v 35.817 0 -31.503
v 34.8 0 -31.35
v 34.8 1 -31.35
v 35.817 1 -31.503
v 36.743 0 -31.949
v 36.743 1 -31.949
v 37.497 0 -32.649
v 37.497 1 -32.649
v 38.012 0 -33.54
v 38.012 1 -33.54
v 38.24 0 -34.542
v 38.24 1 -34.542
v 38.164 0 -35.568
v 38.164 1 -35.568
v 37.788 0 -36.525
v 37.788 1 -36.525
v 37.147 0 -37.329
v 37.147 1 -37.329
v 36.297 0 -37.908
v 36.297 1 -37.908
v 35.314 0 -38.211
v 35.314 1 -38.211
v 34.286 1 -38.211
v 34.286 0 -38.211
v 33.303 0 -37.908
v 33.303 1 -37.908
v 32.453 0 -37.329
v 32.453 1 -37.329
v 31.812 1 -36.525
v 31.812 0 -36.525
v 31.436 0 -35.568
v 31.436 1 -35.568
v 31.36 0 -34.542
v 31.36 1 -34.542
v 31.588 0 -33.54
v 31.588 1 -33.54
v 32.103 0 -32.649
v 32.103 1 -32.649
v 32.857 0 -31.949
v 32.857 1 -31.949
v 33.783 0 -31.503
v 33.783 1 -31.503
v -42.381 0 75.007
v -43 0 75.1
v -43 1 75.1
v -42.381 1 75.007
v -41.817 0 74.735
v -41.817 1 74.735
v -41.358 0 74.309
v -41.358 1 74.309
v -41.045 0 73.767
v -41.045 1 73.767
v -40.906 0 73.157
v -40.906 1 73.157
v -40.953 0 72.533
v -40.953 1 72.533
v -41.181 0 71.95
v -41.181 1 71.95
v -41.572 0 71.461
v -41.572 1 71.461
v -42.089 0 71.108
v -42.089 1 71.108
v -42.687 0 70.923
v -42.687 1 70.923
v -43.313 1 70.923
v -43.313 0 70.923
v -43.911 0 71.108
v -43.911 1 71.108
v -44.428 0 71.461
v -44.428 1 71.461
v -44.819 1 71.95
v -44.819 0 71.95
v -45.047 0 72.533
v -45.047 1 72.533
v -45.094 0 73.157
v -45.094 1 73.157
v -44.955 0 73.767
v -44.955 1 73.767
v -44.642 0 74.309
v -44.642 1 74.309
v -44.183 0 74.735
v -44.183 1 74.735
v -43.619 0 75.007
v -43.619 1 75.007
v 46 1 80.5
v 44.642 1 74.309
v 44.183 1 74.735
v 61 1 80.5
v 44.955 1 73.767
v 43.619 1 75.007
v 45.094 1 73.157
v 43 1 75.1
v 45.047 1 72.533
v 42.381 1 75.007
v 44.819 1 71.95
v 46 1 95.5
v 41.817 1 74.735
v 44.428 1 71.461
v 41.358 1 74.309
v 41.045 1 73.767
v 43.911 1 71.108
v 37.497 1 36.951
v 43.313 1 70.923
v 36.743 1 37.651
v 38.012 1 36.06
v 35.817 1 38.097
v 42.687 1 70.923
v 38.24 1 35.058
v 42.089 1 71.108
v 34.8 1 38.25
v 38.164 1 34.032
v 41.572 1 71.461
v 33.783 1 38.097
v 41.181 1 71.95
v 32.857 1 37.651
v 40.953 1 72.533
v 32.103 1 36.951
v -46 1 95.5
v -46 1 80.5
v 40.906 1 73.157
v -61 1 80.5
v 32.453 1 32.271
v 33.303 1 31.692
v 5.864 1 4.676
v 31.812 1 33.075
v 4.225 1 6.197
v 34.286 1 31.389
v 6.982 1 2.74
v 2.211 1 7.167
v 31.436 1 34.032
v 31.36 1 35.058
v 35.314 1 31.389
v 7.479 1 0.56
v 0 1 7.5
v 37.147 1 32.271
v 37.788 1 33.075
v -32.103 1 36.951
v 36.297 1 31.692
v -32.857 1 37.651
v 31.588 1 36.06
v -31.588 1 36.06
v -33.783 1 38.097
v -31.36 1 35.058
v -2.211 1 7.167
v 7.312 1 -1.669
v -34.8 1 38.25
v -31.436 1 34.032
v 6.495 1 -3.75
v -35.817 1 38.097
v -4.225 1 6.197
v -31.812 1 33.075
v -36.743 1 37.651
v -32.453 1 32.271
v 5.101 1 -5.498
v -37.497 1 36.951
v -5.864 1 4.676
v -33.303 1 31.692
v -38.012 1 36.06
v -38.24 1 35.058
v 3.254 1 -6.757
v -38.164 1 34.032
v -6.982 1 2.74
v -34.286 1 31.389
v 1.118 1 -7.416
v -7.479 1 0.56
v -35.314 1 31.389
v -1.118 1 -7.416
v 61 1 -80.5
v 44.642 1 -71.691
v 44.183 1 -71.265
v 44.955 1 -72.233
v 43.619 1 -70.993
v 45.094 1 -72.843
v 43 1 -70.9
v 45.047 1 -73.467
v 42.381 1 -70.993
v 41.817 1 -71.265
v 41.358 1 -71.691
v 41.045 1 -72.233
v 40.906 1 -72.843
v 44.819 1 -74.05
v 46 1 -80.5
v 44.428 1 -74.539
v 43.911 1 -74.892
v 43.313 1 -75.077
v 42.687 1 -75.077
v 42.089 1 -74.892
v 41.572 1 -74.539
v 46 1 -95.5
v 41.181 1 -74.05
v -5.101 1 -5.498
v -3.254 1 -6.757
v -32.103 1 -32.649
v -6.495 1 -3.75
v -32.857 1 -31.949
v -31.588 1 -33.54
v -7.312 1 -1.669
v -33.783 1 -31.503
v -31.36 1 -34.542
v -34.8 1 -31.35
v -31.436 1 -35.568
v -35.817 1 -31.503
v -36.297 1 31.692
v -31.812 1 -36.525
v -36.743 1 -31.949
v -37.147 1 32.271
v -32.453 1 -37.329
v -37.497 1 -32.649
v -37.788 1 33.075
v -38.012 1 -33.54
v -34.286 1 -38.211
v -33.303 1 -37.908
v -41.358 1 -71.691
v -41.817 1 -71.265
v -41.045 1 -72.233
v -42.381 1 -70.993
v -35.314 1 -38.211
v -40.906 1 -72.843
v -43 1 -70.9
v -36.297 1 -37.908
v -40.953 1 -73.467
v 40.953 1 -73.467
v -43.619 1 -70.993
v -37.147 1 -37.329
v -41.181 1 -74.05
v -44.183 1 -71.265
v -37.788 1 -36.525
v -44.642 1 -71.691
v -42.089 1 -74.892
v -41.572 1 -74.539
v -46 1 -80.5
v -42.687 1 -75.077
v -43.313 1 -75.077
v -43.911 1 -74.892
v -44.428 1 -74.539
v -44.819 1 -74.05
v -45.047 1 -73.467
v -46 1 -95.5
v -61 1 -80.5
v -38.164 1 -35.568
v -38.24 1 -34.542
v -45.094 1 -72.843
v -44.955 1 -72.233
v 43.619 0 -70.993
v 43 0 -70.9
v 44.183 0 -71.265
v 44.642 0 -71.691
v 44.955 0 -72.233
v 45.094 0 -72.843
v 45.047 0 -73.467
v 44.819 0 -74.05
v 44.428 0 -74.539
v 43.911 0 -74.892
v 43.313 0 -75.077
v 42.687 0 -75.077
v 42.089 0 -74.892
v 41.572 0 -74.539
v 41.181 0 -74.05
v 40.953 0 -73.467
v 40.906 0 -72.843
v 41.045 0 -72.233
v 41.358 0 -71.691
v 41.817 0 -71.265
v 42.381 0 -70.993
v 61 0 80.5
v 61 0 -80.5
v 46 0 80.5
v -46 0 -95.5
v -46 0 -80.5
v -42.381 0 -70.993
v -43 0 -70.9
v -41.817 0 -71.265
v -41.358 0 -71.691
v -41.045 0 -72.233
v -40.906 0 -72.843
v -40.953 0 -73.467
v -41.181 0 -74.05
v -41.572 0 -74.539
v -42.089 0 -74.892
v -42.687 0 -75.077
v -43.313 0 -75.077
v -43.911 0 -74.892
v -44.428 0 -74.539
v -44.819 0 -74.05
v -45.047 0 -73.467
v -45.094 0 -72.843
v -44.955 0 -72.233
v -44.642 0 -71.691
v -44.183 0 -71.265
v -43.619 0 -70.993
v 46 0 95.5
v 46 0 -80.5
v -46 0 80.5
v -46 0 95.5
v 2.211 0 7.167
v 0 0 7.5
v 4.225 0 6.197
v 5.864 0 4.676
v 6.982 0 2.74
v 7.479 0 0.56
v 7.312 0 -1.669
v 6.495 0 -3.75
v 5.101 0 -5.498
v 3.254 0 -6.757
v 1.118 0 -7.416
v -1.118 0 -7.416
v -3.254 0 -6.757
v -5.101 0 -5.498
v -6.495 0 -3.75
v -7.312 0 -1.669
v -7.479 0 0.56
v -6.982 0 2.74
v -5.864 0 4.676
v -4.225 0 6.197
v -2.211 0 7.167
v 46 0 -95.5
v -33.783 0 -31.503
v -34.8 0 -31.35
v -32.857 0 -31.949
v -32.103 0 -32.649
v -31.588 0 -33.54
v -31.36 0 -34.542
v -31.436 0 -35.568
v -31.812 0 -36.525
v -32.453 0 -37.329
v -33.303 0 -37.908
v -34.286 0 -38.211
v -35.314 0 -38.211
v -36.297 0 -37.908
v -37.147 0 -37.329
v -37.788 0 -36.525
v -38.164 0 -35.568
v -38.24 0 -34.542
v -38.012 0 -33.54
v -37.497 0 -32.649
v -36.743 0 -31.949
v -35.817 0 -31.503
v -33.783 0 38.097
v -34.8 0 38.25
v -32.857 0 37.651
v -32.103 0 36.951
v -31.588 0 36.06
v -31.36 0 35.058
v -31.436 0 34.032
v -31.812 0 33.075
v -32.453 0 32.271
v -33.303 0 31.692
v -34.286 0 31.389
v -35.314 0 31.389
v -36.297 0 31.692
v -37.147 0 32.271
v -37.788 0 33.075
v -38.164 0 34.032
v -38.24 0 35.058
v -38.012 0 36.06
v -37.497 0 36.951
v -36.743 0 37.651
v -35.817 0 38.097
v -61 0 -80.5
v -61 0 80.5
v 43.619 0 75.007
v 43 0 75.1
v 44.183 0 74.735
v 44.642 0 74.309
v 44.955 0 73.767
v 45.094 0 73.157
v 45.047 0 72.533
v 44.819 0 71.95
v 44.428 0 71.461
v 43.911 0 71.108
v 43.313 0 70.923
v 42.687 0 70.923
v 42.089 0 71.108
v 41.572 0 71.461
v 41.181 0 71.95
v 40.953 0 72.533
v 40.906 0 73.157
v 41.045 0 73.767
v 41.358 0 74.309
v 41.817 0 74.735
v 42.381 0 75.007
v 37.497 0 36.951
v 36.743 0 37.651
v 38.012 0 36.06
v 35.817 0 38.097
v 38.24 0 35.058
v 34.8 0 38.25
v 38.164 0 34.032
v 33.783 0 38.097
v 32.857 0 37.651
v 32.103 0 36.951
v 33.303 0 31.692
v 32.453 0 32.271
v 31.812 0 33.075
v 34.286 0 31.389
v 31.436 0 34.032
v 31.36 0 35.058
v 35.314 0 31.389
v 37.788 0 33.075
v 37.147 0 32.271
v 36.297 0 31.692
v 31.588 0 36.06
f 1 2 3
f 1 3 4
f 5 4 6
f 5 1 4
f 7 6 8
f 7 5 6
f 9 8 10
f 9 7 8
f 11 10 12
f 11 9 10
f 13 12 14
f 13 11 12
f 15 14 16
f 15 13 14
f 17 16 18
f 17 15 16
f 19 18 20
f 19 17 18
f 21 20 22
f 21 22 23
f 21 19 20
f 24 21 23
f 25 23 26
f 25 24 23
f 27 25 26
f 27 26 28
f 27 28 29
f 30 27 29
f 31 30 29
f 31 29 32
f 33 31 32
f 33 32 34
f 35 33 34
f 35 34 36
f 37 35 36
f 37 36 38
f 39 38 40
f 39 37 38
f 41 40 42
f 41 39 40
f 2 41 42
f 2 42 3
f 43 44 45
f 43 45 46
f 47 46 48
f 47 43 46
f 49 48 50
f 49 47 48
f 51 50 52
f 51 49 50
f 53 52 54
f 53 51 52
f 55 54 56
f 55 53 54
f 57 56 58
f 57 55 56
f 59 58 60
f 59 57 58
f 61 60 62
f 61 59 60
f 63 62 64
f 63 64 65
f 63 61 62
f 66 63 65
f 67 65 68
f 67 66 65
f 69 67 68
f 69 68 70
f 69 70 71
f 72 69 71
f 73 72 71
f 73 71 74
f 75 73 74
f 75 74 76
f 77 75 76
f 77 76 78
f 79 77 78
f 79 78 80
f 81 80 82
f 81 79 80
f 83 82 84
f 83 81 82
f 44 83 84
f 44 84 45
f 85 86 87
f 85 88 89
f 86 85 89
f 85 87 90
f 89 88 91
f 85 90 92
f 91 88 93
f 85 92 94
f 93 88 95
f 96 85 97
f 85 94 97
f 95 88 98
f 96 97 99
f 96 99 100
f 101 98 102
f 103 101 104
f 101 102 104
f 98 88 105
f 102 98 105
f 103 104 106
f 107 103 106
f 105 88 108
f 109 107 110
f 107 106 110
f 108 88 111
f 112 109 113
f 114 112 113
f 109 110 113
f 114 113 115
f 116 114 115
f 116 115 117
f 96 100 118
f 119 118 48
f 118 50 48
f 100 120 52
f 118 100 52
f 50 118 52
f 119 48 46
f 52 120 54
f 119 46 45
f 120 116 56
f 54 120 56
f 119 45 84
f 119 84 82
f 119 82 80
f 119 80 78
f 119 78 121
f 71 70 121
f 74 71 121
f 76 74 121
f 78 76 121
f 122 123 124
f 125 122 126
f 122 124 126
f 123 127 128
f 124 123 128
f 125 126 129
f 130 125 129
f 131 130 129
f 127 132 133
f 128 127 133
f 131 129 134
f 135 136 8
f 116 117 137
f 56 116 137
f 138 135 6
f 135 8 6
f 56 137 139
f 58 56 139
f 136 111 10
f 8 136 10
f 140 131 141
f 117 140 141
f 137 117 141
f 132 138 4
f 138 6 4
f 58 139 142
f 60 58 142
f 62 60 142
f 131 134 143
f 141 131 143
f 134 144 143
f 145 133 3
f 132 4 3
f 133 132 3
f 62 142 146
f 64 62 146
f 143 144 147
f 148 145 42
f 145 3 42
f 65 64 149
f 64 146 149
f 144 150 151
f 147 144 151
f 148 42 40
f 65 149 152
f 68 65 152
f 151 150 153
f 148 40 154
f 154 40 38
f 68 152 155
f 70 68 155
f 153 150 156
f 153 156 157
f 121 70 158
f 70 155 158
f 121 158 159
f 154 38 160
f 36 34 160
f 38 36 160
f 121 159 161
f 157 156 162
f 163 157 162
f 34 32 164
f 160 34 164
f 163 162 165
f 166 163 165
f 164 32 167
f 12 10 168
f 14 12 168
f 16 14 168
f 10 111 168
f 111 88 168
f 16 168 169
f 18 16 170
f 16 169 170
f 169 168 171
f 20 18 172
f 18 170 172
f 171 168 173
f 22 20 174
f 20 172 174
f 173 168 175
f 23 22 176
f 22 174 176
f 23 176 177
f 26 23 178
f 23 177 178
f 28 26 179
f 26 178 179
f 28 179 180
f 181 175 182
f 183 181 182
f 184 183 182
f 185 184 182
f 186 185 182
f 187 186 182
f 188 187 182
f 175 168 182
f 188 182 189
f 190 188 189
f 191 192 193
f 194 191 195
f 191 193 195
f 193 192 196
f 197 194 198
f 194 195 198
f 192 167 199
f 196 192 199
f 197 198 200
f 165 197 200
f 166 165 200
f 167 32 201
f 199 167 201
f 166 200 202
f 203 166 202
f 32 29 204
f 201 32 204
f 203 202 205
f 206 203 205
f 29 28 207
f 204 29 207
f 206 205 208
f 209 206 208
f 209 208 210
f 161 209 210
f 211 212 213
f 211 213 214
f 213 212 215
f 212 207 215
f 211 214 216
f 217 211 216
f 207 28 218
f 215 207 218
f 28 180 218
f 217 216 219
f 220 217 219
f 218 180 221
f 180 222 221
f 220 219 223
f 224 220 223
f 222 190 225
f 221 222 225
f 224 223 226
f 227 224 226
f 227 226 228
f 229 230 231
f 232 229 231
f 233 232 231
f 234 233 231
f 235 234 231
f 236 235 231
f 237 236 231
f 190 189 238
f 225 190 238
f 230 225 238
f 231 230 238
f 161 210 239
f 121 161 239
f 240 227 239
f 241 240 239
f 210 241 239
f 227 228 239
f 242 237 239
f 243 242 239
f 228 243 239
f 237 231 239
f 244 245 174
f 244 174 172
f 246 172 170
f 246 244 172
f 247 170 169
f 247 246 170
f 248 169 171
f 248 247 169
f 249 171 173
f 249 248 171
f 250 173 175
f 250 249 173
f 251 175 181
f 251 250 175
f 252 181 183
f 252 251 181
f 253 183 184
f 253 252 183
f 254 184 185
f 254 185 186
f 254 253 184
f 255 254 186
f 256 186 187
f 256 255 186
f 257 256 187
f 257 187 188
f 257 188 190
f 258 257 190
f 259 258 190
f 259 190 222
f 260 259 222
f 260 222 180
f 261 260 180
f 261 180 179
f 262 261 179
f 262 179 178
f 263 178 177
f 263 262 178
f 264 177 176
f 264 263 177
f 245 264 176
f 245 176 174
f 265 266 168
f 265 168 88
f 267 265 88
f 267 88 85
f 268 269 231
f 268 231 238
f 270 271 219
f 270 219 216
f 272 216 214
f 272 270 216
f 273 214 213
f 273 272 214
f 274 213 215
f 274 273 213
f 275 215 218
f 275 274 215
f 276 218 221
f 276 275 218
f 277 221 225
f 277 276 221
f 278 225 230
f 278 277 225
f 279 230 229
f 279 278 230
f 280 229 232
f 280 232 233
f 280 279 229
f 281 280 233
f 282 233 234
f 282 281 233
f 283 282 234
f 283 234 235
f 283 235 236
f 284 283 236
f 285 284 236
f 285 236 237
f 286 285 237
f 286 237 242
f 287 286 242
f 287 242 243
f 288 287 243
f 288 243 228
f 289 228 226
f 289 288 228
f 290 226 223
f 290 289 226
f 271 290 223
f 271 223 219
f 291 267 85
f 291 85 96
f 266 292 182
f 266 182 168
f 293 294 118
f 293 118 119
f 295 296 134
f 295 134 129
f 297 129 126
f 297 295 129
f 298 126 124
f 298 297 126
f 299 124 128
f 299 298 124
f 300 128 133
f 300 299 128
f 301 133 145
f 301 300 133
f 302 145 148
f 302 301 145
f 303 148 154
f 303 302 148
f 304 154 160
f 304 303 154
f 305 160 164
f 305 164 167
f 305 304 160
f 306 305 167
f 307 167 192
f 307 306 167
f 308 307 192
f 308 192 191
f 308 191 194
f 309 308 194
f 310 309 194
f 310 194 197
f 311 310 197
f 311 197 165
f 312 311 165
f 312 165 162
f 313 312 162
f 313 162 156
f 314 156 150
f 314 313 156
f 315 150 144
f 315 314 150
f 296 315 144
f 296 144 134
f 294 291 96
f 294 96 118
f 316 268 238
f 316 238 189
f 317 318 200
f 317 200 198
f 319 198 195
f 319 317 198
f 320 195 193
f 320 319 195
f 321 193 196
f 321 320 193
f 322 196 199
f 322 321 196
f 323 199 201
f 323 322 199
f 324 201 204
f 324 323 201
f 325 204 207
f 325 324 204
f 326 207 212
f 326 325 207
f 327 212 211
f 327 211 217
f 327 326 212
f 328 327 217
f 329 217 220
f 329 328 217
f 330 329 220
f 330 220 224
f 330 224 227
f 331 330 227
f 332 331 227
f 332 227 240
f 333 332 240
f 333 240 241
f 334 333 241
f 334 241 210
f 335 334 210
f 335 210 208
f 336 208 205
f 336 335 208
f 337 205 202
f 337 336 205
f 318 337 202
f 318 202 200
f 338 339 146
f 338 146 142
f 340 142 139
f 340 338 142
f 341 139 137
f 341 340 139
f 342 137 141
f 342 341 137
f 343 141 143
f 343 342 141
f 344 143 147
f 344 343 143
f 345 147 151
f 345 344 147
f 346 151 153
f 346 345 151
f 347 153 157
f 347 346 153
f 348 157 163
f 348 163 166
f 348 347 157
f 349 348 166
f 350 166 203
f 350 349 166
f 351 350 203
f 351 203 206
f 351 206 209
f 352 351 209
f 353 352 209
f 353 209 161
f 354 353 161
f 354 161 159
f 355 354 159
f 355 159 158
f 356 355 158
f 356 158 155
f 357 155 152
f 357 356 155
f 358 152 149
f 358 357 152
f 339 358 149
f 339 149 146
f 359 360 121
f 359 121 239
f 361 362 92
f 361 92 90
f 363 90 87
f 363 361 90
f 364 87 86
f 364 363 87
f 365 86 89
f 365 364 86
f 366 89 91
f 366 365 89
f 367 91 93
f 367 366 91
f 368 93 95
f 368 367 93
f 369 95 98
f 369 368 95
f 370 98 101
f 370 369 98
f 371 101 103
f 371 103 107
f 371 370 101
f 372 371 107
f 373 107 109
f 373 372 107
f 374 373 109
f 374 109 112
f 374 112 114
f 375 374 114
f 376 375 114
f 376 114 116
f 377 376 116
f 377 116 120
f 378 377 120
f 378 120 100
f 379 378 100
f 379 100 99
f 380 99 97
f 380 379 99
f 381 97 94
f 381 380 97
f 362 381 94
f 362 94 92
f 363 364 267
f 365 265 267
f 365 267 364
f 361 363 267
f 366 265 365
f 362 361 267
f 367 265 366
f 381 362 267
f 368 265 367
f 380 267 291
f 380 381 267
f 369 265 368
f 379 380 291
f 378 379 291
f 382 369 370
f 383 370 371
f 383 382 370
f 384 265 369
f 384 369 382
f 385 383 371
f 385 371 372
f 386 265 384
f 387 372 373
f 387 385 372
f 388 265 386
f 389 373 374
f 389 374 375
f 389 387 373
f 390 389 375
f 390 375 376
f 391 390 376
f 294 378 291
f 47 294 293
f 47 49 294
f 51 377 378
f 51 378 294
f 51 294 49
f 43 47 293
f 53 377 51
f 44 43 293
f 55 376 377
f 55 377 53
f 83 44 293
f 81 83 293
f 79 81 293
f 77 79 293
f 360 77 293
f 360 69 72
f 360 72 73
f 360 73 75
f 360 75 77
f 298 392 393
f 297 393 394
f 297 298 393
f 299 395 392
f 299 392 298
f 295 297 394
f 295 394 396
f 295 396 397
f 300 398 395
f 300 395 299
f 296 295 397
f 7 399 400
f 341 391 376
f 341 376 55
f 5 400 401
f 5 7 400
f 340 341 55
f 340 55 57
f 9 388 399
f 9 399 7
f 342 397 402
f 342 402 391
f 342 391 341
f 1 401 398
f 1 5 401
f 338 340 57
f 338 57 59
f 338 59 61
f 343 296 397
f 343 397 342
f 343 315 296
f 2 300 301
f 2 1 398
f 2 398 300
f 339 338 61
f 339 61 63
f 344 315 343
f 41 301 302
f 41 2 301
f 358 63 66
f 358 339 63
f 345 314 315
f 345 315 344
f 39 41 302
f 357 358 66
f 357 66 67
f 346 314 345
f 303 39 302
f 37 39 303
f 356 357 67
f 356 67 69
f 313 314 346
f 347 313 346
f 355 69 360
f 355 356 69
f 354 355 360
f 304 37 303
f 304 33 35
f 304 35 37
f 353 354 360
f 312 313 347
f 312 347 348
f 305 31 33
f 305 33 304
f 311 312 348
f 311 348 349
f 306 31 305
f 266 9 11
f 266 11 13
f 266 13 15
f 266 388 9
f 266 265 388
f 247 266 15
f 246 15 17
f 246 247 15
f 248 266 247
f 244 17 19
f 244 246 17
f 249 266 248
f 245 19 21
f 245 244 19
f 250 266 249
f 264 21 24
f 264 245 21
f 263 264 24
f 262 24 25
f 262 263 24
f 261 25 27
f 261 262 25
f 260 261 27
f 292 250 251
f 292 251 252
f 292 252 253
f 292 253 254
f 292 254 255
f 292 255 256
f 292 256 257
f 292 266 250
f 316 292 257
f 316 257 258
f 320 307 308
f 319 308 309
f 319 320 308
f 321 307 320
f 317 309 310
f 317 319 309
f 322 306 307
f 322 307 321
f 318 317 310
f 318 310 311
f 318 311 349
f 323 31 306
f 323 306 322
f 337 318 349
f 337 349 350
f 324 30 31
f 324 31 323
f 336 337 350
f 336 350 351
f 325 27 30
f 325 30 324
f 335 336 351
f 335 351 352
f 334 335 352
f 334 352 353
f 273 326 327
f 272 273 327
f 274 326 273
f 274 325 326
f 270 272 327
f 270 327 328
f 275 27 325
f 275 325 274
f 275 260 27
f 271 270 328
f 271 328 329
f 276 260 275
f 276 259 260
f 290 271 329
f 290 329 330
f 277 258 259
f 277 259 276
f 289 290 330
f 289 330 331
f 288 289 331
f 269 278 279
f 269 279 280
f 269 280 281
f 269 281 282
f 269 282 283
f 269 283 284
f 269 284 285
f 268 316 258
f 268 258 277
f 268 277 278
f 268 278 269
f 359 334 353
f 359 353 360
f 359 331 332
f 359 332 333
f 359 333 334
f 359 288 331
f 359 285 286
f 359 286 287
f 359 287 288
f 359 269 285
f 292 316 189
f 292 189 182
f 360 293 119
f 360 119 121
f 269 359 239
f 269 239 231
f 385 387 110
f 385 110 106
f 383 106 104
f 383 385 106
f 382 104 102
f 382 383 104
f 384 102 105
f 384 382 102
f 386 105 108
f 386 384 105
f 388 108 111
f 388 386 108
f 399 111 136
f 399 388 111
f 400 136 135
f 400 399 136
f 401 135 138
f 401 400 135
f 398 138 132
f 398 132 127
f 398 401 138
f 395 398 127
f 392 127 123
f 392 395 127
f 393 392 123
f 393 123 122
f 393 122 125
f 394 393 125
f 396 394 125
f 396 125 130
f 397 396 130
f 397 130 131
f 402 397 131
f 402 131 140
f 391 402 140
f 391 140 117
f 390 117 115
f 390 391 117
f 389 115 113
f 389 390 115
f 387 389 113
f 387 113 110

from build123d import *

# Parameters (mm, degrees)
SKETCH1_R           = 3.45
SKETCH1_R_2         = 7.5
SKETCH1_R_3         = 2.1
BOSS_EXTRUDE1_DEPTH = 1


with BuildPart() as part:
    # Sketch1 → Boss-Extrude1 (new body)
    with BuildSketch(Plane(origin=(0, 0, 0), x_dir=(1, 0, 0), z_dir=(0, 1, 0))):
        Polygon((-46, -80.5), (-61, -80.5), (-61, 80.5), (-46, 80.5), (-46, 95.5), (46, 95.5), (46, 80.5), (61, 80.5), (61, -80.5), (46, -80.5), (46, -95.5), (-46, -95.5), align=None)
        with Locations(Location((-34.8, 34.8, 0), (0, 0, 270))):
            Circle(SKETCH1_R, mode=Mode.SUBTRACT)
        with Locations(Location((34.8, 34.8, 0), (0, 0, 270))):
            Circle(SKETCH1_R, mode=Mode.SUBTRACT)
        with Locations(Location((34.8, -34.8, 0), (0, 0, 270))):
            Circle(SKETCH1_R, mode=Mode.SUBTRACT)
        with Locations(Location((-34.8, -34.8, 0), (0, 0, 270))):
            Circle(SKETCH1_R, mode=Mode.SUBTRACT)
        with Locations(Location((0, 0, 0), (0, 0, 270))):
            Circle(SKETCH1_R_2, mode=Mode.SUBTRACT)
        with Locations(Location((-43, -73, 0), (0, 0, 270))):
            Circle(SKETCH1_R_3, mode=Mode.SUBTRACT)
        with Locations(Location((43, -73, 0), (0, 0, 270))):
            Circle(SKETCH1_R_3, mode=Mode.SUBTRACT)
        with Locations(Location((-43, 73, 0), (0, 0, 270))):
            Circle(SKETCH1_R_3, mode=Mode.SUBTRACT)
        with Locations(Location((43, 73, 0), (0, 0, 270))):
            Circle(SKETCH1_R_3, mode=Mode.SUBTRACT)
    extrude(amount=BOSS_EXTRUDE1_DEPTH)


solid = part.part
